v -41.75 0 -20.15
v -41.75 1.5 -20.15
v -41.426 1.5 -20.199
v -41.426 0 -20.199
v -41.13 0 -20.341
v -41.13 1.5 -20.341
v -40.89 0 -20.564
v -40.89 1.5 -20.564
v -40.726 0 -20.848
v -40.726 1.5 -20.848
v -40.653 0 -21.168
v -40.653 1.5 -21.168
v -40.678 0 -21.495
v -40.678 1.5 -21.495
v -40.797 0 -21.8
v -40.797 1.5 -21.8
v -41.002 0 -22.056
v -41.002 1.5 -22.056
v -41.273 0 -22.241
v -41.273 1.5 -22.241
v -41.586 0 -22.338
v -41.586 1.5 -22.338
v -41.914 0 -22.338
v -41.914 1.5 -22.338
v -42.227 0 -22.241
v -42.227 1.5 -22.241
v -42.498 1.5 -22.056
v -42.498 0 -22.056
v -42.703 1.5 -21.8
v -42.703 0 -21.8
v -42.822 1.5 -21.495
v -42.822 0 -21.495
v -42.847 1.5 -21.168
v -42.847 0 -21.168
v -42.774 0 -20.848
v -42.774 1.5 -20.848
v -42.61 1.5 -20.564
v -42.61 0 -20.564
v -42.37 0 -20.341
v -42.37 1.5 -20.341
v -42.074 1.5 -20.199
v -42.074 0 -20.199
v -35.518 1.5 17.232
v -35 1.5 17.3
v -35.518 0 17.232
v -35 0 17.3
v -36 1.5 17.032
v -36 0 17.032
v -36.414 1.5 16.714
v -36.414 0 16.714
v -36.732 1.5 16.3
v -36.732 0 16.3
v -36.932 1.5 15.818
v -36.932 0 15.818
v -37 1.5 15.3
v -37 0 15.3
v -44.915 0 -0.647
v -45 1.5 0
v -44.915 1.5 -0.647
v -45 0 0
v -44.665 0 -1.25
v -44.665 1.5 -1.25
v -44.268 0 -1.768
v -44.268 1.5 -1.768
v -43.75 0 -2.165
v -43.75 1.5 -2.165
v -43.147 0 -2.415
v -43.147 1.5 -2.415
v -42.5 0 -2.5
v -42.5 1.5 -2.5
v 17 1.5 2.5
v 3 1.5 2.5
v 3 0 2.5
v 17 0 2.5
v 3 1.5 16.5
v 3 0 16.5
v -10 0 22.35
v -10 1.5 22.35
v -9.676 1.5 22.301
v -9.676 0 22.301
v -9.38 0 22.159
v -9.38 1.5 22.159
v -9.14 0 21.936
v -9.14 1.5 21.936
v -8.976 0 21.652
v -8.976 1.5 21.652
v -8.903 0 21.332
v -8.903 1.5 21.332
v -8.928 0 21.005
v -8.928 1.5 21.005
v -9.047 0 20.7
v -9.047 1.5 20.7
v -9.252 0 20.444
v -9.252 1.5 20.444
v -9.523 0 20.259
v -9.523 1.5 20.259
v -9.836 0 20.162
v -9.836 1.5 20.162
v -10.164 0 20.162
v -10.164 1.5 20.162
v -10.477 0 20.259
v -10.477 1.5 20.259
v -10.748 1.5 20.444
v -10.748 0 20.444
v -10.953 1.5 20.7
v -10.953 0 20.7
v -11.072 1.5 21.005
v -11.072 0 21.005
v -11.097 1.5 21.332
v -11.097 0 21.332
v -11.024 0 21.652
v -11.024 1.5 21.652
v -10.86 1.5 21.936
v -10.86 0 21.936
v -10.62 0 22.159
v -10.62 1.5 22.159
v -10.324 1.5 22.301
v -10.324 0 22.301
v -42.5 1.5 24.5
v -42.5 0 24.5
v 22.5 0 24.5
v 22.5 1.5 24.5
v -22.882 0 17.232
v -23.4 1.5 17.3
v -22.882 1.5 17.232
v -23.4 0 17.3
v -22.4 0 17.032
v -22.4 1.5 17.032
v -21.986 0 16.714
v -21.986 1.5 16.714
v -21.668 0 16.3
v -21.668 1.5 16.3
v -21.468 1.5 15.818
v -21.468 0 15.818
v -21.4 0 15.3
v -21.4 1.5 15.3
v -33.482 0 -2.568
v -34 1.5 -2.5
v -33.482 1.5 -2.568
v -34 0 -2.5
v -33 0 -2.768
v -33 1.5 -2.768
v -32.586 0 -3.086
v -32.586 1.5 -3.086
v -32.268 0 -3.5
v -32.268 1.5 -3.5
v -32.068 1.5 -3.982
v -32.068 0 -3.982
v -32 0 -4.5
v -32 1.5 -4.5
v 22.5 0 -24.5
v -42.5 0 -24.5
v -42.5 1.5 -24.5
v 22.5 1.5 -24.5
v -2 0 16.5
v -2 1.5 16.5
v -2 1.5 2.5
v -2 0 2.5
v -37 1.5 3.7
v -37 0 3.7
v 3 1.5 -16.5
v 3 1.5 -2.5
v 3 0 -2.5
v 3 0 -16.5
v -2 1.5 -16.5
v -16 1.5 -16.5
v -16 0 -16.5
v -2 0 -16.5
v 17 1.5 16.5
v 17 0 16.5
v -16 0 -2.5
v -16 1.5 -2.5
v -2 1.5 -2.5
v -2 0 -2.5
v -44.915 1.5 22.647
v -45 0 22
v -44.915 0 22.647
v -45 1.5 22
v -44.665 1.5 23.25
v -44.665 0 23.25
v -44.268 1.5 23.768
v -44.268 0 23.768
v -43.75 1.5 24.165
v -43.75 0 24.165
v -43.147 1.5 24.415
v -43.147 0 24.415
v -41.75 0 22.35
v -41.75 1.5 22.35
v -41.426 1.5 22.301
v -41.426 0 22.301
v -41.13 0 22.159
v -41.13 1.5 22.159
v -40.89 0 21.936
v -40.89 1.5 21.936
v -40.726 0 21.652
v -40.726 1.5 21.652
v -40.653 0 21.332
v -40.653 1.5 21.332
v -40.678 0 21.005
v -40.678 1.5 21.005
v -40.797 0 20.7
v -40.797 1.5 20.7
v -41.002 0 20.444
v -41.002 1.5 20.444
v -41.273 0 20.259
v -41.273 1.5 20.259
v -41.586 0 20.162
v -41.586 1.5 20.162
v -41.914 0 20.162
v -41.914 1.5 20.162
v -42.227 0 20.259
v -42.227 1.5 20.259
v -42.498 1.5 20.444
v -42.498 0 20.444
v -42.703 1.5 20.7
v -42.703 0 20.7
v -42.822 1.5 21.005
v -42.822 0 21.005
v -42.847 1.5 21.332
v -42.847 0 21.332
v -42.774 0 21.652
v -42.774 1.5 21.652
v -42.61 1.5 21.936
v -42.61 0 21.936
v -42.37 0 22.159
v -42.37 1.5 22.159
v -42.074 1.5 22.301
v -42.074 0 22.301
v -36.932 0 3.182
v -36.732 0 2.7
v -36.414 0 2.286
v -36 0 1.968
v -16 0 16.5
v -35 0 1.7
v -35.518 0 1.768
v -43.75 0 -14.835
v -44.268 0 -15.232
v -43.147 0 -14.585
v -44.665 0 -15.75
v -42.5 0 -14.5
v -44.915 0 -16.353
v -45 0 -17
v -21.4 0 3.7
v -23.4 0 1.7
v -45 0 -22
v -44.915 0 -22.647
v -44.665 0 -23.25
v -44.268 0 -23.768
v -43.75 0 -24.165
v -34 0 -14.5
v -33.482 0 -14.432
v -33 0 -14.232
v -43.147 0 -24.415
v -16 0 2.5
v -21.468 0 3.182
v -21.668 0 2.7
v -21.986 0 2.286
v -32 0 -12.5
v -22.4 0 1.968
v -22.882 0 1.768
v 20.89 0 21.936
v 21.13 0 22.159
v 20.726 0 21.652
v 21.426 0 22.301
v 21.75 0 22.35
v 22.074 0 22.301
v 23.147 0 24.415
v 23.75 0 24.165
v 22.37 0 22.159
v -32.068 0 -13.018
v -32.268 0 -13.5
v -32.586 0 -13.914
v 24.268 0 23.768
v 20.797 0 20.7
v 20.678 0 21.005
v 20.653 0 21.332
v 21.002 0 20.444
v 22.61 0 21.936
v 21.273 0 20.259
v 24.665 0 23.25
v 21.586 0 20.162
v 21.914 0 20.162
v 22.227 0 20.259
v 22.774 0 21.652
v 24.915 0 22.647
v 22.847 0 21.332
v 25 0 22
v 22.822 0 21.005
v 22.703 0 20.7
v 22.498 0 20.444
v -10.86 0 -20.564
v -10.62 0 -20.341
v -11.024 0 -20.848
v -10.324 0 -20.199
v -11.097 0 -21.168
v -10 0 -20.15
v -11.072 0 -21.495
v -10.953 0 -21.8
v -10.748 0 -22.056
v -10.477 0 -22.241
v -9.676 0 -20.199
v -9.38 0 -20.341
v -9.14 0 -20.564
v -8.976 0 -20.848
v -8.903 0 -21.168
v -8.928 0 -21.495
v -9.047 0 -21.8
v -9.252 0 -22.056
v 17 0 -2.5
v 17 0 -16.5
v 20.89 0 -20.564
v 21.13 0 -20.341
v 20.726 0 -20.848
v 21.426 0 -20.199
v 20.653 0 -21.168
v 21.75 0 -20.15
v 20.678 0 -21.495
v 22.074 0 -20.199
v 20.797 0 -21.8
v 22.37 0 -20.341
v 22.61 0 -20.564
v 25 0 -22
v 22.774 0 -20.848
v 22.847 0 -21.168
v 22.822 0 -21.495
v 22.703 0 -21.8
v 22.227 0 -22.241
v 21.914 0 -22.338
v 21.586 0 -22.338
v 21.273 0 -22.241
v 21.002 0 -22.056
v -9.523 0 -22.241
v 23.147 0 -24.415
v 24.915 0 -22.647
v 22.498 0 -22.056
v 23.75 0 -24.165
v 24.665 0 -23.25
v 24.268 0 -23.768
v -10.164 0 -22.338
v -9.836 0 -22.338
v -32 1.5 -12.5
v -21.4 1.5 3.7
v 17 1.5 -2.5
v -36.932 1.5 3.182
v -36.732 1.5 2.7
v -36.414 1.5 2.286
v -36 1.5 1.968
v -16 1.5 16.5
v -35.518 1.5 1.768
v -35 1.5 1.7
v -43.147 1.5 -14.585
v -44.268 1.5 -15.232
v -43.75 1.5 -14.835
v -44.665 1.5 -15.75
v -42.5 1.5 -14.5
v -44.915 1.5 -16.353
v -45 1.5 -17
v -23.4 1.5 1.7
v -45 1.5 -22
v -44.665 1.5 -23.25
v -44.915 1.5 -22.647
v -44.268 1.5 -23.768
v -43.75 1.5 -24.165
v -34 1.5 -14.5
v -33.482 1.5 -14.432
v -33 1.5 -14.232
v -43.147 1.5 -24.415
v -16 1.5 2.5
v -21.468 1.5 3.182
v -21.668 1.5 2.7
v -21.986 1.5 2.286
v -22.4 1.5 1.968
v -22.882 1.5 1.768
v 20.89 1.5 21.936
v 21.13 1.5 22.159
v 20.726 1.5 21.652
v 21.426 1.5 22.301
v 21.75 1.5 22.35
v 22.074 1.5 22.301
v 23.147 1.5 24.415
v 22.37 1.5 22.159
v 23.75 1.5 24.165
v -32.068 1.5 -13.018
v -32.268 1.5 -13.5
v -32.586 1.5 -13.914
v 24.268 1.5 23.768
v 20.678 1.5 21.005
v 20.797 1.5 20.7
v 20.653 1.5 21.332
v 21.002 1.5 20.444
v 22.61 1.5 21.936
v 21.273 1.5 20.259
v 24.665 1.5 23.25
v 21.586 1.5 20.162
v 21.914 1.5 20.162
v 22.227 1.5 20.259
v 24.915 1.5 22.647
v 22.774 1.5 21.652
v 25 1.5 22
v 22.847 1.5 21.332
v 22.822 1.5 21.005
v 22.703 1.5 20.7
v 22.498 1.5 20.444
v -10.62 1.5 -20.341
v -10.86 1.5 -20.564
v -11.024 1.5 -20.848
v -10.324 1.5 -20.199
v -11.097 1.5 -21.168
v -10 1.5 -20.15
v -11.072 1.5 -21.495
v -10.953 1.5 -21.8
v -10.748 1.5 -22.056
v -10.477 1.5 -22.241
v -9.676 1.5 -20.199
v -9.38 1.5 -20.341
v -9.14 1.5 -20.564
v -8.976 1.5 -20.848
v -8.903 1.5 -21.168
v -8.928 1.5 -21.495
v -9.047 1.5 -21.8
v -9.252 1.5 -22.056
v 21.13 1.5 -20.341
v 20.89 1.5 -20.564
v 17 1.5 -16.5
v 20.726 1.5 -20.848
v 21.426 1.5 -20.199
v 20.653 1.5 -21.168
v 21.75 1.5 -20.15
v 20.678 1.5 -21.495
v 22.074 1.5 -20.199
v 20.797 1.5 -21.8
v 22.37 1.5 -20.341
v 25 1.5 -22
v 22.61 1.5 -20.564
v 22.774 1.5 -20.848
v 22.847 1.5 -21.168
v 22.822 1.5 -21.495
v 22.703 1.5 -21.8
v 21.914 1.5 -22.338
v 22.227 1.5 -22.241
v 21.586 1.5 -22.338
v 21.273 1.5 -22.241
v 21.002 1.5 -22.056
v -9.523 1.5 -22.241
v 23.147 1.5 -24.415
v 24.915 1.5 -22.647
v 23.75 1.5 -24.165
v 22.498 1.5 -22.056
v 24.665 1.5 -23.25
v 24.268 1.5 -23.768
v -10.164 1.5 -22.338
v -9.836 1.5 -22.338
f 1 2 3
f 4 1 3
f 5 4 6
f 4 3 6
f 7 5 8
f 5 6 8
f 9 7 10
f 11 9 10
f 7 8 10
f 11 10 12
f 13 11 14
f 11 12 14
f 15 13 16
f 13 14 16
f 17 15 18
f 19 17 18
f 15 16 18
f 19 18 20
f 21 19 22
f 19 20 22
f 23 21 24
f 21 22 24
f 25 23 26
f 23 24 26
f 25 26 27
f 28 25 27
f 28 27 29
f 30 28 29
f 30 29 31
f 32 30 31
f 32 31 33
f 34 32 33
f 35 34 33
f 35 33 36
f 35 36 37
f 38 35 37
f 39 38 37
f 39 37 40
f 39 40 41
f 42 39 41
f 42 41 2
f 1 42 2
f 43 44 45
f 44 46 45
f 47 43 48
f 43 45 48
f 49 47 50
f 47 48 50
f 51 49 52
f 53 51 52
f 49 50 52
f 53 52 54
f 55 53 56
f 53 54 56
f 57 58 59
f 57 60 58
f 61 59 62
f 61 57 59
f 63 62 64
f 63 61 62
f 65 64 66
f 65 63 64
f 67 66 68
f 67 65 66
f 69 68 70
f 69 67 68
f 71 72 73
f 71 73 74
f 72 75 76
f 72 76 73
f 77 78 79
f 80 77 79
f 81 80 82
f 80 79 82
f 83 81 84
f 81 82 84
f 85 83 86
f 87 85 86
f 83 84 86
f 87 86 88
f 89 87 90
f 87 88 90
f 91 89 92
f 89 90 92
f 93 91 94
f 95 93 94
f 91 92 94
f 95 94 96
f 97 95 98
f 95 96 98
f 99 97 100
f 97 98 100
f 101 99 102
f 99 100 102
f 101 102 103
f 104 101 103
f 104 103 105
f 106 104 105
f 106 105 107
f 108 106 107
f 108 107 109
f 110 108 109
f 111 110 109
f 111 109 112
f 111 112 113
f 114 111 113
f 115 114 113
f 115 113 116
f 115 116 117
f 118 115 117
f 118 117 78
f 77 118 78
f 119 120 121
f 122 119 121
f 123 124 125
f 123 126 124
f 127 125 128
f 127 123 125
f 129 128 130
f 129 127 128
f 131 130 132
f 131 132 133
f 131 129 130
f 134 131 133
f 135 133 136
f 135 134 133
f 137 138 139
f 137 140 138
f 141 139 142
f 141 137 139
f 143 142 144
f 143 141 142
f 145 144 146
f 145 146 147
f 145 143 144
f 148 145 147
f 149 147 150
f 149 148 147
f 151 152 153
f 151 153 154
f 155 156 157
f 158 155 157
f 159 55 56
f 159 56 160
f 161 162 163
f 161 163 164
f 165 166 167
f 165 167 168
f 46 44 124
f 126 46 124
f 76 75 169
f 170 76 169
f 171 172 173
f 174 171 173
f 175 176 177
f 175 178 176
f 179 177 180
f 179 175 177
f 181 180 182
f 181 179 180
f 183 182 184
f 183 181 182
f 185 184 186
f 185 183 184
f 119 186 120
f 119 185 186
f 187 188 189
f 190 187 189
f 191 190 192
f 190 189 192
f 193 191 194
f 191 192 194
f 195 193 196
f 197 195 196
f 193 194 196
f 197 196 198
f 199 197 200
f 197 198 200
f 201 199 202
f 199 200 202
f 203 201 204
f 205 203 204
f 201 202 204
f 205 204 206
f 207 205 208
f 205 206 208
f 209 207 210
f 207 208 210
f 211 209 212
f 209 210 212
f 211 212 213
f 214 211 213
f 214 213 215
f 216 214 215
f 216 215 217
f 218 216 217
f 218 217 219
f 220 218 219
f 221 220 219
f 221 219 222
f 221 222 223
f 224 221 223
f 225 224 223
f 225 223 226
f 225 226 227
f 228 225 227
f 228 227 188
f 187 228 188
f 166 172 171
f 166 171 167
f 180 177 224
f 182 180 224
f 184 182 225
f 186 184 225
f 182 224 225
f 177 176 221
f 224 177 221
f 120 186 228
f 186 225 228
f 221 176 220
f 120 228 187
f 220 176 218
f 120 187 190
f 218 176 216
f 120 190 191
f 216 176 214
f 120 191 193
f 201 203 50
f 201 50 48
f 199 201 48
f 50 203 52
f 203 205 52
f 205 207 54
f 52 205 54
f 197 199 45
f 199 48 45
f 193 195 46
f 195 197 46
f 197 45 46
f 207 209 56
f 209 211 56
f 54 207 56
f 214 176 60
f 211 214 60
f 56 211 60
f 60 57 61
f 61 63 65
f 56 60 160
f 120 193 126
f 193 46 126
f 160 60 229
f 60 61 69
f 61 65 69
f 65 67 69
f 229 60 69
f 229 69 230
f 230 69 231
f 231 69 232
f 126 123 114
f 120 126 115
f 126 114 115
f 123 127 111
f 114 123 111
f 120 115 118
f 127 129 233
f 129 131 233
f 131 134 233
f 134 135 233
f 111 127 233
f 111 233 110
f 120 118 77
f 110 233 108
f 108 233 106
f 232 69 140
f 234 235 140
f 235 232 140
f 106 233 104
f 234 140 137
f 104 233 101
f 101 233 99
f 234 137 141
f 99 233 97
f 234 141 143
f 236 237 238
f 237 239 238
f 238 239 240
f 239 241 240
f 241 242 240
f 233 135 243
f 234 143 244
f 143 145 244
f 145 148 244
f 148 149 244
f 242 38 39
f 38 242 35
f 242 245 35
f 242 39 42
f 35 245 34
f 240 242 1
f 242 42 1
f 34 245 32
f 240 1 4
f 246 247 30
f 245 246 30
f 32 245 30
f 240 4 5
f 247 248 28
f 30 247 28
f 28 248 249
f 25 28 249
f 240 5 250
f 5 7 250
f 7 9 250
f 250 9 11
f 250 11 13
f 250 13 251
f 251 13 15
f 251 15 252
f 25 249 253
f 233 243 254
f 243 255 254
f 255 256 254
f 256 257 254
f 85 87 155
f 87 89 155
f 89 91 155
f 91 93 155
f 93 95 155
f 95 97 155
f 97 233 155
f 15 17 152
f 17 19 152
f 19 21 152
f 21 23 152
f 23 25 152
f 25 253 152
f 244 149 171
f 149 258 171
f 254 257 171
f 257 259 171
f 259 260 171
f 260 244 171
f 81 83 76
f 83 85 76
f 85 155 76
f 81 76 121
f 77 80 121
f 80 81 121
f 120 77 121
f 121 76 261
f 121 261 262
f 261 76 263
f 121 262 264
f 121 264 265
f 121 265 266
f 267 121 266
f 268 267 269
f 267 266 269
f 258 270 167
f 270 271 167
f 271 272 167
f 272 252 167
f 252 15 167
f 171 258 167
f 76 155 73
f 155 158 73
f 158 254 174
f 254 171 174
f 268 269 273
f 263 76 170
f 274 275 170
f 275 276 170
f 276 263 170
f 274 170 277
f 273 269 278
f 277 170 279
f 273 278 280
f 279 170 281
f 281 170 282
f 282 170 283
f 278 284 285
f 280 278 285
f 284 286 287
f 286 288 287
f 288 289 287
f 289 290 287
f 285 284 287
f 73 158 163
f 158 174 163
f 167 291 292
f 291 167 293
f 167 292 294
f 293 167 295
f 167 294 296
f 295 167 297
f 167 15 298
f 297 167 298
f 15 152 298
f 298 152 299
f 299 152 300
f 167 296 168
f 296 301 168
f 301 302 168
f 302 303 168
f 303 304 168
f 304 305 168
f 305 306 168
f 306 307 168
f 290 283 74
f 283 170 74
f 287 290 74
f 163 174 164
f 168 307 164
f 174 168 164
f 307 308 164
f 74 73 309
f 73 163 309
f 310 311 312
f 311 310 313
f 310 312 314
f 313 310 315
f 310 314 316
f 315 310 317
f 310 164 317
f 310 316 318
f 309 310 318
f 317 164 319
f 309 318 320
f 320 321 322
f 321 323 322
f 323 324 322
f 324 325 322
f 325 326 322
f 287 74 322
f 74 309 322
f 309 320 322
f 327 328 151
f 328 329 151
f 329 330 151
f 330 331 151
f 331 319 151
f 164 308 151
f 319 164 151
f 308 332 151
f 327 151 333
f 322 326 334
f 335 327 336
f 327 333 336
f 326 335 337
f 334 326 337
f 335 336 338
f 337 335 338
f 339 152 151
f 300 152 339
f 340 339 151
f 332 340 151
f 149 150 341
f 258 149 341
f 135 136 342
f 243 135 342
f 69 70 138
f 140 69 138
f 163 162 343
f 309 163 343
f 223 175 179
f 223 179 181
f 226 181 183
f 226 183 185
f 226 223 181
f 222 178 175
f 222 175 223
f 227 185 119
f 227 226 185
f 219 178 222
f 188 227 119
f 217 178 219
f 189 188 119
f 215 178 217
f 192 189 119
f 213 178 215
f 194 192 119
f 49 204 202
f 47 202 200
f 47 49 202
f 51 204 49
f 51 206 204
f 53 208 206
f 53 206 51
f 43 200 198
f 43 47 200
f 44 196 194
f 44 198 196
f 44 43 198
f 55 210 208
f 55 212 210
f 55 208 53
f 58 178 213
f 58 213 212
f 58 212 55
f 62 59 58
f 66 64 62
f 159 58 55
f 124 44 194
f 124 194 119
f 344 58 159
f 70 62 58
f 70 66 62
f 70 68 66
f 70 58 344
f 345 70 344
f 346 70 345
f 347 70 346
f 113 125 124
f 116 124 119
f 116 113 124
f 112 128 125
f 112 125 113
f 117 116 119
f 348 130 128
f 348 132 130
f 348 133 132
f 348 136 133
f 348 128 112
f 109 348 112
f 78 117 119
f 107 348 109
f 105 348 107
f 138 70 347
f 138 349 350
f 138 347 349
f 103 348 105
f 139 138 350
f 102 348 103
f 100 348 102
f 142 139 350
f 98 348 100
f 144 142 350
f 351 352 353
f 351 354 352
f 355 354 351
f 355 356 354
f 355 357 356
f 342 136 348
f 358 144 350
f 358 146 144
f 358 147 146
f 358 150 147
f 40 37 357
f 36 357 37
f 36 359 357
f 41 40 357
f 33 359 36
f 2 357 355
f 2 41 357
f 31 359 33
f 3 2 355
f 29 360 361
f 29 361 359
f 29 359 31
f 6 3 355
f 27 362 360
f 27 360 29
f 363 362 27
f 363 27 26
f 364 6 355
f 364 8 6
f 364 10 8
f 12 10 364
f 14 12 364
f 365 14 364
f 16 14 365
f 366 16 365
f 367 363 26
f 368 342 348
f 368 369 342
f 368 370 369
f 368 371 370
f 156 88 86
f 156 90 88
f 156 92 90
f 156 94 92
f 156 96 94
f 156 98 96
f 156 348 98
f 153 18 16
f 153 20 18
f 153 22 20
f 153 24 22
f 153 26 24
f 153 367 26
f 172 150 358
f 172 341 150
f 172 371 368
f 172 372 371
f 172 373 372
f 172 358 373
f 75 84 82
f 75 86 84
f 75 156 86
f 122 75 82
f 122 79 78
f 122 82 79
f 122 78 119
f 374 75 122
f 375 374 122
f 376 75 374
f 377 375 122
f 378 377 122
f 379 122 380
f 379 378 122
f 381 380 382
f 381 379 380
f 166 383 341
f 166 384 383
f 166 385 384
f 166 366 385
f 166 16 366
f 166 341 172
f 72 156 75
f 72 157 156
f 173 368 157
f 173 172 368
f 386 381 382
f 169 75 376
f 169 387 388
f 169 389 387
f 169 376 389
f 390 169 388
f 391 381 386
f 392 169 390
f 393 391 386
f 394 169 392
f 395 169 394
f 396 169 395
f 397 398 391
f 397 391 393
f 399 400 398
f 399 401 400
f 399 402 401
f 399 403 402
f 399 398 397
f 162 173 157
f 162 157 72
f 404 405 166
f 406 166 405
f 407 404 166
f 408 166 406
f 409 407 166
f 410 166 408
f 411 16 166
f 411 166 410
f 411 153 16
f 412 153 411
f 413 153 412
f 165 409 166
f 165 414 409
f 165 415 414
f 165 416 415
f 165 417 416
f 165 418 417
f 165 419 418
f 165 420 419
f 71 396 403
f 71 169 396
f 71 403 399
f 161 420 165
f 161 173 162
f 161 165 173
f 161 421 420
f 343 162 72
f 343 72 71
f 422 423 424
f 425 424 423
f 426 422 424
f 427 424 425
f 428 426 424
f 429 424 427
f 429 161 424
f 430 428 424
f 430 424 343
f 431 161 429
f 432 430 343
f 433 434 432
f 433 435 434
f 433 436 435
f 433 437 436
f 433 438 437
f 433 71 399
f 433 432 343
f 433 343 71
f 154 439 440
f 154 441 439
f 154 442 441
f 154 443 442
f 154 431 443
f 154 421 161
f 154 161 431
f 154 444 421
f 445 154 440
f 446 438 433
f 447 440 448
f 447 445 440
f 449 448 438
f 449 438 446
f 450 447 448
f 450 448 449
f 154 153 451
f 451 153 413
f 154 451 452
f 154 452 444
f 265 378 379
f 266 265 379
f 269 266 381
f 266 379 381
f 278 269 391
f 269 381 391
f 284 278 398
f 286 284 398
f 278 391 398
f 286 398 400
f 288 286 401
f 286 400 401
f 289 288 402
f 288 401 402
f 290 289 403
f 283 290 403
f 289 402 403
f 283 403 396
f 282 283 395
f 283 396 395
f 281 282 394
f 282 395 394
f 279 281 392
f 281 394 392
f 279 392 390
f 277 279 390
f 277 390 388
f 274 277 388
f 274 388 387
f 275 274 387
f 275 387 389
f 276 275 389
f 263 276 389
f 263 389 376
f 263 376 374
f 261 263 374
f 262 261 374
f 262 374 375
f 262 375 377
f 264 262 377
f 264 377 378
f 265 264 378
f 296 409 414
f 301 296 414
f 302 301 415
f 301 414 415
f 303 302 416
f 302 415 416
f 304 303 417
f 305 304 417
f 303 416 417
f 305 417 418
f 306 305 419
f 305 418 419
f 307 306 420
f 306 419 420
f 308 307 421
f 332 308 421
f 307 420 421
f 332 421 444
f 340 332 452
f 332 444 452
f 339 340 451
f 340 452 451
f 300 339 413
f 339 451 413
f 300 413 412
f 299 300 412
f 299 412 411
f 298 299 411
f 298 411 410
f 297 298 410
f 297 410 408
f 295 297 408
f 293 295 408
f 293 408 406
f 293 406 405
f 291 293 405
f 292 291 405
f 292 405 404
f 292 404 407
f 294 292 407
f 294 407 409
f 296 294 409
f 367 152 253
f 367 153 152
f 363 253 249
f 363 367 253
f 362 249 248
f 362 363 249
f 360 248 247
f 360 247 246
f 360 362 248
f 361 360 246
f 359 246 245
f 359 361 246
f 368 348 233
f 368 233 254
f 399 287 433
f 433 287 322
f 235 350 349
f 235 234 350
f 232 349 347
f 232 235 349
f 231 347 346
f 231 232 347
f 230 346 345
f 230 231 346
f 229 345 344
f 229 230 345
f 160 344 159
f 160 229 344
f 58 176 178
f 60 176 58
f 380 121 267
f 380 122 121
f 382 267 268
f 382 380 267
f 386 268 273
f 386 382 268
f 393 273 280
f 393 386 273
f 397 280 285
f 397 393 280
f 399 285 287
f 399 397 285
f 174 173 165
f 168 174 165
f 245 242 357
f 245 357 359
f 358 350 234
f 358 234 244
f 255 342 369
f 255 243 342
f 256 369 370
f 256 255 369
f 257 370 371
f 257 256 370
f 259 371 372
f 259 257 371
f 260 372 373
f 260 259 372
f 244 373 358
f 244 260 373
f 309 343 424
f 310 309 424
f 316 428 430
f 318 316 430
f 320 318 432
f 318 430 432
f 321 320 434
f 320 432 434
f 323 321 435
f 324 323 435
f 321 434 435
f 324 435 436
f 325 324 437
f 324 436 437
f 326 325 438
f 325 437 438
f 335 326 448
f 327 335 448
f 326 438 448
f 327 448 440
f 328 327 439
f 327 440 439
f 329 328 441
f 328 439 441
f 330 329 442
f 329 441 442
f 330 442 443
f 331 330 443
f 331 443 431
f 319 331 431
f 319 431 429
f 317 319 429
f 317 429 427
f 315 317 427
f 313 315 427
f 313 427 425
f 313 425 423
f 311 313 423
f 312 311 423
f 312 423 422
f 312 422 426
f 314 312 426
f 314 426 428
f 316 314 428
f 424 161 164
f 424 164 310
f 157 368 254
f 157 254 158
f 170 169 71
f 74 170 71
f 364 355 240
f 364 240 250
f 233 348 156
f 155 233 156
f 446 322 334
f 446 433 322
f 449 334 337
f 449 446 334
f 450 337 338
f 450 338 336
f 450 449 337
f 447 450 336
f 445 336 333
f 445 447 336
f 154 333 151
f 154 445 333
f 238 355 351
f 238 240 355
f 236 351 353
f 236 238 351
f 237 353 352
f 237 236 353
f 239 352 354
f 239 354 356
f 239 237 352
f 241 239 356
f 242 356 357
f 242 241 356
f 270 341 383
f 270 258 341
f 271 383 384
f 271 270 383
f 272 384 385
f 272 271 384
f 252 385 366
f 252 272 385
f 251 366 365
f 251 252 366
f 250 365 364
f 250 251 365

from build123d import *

# Parameters (mm, degrees)
SKETCH1_W            = 40
SKETCH1_H            = 39
BOSS_EXTRUDE1_DEPTH  = 1.5
SKETCH3_W            = 70
SKETCH3_H            = 49
BOSS_EXTRUDE2_DEPTH  = 1.5
SKETCH4_W            = 13
SKETCH4_H            = 12
CUT_EXTRUDE1_DEPTH   = 52.259145525
SKETCH5_W            = 15.6
SKETCH5_H            = 15.6
CUT_EXTRUDE2_DEPTH   = 52.259145525
FILLET2_R            = 2
SKETCH6_R            = 1.1
CUT_EXTRUDE3_DEPTH   = 52.259145525
FILLET4_R            = 2.5
SKETCH7_W            = 14
SKETCH7_H            = 14
CUT_EXTRUDE4_DEPTH   = 52.259145525
LPATTERN1_COUNT      = 2
LPATTERN1_PITCH      = 19
LPATTERN1_COUNT_DIR2 = 2
LPATTERN1_PITCH_DIR2 = 19
FILLET5_R            = 2


with BuildPart() as part:
    # Sketch1 → Boss-Extrude1 (new body)
    with BuildSketch(Plane(origin=(0, 0, 0), x_dir=(1, 0, 0), z_dir=(0, 1, 0))):
        Rectangle(SKETCH1_W, SKETCH1_H)
    extrude(amount=BOSS_EXTRUDE1_DEPTH)

    # Sketch3 → Boss-Extrude2 (add)
    with BuildSketch(Plane(origin=(0, 0, 0), x_dir=(1, 0, 0), z_dir=(0, 1, 0))):
        with Locations((-10, 0)):
            Rectangle(SKETCH3_W, SKETCH3_H)
    extrude(amount=BOSS_EXTRUDE2_DEPTH)

    # Sketch4 → Cut-Extrude1 (cut, through all)
    with BuildSketch(Plane(origin=(0, 1.5, 0), x_dir=(1, 0, 0), z_dir=(0, 1, 0))):
        with Locations((-38.5, 8.5)):
            Rectangle(SKETCH4_W, SKETCH4_H)
    extrude(amount=-CUT_EXTRUDE1_DEPTH, mode=Mode.SUBTRACT)

    # Sketch5 → Cut-Extrude2 (cut, through all)
    with BuildSketch(Plane(origin=(0, 1.5, 0), x_dir=(1, 0, 0), z_dir=(0, 1, 0))):
        with Locations((-29.2, -9.5)):
            Rectangle(SKETCH5_W, SKETCH5_H)
    extrude(amount=-CUT_EXTRUDE2_DEPTH, mode=Mode.SUBTRACT)

    # Fillet2
    fillet2_edges = [part.edges().sort_by_distance(p)[0] for p in [
        (-37, 0.75, 17.3),
        (-37, 0.75, 1.7),
        (-21.4, 0.75, 1.7),
        (-21.4, 0.75, 17.3),
    ]]
    fillet(fillet2_edges, radius=FILLET2_R)

    # Sketch6 → Cut-Extrude3 (cut, through all)
    with BuildSketch(Plane(origin=(0, 1.5, 0), x_dir=(1, 0, 0), z_dir=(0, 1, 0))):
        with Locations(Location((-41.75, 21.25, 0), (0, 0, 270))):
            Circle(SKETCH6_R)
        with Locations(Location((21.75, 21.25, 0), (0, 0, 270))):
            Circle(SKETCH6_R)
        with Locations(Location((21.75, -21.25, 0), (0, 0, 270))):
            Circle(SKETCH6_R)
        with Locations(Location((-41.75, -21.25, 0), (0, 0, 270))):
            Circle(SKETCH6_R)
        with Locations(Location((-10, -21.25, 0), (0, 0, 270))):
            Circle(SKETCH6_R)
        with Locations(Location((-10, 21.25, 0), (0, 0, 270))):
            Circle(SKETCH6_R)
    extrude(amount=-CUT_EXTRUDE3_DEPTH, mode=Mode.SUBTRACT)

    # Fillet4
    fillet4_edges = [part.edges().sort_by_distance(p)[0] for p in [
        (25, 0.75, 24.5),
        (25, 0.75, -24.5),
        (-45, 0.75, -24.5),
        (-45, 0.75, 24.5),
        (-45, 0.75, -2.5),
        (-45, 0.75, -14.5),
    ]]
    fillet(fillet4_edges, radius=FILLET4_R)

    # Sketch7 → Cut-Extrude4 (cut, through all)
    with BuildSketch(Plane(origin=(0, 1.5, 0), x_dir=(1, 0, 0), z_dir=(0, 1, 0))):
        with Locations((-9, 9.5)):
            Rectangle(SKETCH7_W, SKETCH7_H)
    cut_extrude4 = extrude(amount=-CUT_EXTRUDE4_DEPTH, mode=Mode.SUBTRACT)

    # LPattern1: Cut-Extrude4 2 × 2
    with Locations(*[(i * LPATTERN1_PITCH, 0, j * LPATTERN1_PITCH_DIR2) for i in range(LPATTERN1_COUNT) for j in range(LPATTERN1_COUNT_DIR2) if (i, j) != (0, 0)]):
        add(cut_extrude4, mode=Mode.SUBTRACT)

    # Fillet5
    fillet5_edges = [part.edges().sort_by_distance(p)[0] for p in [
        (-32, 0.75, -14.5),
        (-32, 0.75, -2.5),
    ]]
    fillet(fillet5_edges, radius=FILLET5_R)


solid = part.part
